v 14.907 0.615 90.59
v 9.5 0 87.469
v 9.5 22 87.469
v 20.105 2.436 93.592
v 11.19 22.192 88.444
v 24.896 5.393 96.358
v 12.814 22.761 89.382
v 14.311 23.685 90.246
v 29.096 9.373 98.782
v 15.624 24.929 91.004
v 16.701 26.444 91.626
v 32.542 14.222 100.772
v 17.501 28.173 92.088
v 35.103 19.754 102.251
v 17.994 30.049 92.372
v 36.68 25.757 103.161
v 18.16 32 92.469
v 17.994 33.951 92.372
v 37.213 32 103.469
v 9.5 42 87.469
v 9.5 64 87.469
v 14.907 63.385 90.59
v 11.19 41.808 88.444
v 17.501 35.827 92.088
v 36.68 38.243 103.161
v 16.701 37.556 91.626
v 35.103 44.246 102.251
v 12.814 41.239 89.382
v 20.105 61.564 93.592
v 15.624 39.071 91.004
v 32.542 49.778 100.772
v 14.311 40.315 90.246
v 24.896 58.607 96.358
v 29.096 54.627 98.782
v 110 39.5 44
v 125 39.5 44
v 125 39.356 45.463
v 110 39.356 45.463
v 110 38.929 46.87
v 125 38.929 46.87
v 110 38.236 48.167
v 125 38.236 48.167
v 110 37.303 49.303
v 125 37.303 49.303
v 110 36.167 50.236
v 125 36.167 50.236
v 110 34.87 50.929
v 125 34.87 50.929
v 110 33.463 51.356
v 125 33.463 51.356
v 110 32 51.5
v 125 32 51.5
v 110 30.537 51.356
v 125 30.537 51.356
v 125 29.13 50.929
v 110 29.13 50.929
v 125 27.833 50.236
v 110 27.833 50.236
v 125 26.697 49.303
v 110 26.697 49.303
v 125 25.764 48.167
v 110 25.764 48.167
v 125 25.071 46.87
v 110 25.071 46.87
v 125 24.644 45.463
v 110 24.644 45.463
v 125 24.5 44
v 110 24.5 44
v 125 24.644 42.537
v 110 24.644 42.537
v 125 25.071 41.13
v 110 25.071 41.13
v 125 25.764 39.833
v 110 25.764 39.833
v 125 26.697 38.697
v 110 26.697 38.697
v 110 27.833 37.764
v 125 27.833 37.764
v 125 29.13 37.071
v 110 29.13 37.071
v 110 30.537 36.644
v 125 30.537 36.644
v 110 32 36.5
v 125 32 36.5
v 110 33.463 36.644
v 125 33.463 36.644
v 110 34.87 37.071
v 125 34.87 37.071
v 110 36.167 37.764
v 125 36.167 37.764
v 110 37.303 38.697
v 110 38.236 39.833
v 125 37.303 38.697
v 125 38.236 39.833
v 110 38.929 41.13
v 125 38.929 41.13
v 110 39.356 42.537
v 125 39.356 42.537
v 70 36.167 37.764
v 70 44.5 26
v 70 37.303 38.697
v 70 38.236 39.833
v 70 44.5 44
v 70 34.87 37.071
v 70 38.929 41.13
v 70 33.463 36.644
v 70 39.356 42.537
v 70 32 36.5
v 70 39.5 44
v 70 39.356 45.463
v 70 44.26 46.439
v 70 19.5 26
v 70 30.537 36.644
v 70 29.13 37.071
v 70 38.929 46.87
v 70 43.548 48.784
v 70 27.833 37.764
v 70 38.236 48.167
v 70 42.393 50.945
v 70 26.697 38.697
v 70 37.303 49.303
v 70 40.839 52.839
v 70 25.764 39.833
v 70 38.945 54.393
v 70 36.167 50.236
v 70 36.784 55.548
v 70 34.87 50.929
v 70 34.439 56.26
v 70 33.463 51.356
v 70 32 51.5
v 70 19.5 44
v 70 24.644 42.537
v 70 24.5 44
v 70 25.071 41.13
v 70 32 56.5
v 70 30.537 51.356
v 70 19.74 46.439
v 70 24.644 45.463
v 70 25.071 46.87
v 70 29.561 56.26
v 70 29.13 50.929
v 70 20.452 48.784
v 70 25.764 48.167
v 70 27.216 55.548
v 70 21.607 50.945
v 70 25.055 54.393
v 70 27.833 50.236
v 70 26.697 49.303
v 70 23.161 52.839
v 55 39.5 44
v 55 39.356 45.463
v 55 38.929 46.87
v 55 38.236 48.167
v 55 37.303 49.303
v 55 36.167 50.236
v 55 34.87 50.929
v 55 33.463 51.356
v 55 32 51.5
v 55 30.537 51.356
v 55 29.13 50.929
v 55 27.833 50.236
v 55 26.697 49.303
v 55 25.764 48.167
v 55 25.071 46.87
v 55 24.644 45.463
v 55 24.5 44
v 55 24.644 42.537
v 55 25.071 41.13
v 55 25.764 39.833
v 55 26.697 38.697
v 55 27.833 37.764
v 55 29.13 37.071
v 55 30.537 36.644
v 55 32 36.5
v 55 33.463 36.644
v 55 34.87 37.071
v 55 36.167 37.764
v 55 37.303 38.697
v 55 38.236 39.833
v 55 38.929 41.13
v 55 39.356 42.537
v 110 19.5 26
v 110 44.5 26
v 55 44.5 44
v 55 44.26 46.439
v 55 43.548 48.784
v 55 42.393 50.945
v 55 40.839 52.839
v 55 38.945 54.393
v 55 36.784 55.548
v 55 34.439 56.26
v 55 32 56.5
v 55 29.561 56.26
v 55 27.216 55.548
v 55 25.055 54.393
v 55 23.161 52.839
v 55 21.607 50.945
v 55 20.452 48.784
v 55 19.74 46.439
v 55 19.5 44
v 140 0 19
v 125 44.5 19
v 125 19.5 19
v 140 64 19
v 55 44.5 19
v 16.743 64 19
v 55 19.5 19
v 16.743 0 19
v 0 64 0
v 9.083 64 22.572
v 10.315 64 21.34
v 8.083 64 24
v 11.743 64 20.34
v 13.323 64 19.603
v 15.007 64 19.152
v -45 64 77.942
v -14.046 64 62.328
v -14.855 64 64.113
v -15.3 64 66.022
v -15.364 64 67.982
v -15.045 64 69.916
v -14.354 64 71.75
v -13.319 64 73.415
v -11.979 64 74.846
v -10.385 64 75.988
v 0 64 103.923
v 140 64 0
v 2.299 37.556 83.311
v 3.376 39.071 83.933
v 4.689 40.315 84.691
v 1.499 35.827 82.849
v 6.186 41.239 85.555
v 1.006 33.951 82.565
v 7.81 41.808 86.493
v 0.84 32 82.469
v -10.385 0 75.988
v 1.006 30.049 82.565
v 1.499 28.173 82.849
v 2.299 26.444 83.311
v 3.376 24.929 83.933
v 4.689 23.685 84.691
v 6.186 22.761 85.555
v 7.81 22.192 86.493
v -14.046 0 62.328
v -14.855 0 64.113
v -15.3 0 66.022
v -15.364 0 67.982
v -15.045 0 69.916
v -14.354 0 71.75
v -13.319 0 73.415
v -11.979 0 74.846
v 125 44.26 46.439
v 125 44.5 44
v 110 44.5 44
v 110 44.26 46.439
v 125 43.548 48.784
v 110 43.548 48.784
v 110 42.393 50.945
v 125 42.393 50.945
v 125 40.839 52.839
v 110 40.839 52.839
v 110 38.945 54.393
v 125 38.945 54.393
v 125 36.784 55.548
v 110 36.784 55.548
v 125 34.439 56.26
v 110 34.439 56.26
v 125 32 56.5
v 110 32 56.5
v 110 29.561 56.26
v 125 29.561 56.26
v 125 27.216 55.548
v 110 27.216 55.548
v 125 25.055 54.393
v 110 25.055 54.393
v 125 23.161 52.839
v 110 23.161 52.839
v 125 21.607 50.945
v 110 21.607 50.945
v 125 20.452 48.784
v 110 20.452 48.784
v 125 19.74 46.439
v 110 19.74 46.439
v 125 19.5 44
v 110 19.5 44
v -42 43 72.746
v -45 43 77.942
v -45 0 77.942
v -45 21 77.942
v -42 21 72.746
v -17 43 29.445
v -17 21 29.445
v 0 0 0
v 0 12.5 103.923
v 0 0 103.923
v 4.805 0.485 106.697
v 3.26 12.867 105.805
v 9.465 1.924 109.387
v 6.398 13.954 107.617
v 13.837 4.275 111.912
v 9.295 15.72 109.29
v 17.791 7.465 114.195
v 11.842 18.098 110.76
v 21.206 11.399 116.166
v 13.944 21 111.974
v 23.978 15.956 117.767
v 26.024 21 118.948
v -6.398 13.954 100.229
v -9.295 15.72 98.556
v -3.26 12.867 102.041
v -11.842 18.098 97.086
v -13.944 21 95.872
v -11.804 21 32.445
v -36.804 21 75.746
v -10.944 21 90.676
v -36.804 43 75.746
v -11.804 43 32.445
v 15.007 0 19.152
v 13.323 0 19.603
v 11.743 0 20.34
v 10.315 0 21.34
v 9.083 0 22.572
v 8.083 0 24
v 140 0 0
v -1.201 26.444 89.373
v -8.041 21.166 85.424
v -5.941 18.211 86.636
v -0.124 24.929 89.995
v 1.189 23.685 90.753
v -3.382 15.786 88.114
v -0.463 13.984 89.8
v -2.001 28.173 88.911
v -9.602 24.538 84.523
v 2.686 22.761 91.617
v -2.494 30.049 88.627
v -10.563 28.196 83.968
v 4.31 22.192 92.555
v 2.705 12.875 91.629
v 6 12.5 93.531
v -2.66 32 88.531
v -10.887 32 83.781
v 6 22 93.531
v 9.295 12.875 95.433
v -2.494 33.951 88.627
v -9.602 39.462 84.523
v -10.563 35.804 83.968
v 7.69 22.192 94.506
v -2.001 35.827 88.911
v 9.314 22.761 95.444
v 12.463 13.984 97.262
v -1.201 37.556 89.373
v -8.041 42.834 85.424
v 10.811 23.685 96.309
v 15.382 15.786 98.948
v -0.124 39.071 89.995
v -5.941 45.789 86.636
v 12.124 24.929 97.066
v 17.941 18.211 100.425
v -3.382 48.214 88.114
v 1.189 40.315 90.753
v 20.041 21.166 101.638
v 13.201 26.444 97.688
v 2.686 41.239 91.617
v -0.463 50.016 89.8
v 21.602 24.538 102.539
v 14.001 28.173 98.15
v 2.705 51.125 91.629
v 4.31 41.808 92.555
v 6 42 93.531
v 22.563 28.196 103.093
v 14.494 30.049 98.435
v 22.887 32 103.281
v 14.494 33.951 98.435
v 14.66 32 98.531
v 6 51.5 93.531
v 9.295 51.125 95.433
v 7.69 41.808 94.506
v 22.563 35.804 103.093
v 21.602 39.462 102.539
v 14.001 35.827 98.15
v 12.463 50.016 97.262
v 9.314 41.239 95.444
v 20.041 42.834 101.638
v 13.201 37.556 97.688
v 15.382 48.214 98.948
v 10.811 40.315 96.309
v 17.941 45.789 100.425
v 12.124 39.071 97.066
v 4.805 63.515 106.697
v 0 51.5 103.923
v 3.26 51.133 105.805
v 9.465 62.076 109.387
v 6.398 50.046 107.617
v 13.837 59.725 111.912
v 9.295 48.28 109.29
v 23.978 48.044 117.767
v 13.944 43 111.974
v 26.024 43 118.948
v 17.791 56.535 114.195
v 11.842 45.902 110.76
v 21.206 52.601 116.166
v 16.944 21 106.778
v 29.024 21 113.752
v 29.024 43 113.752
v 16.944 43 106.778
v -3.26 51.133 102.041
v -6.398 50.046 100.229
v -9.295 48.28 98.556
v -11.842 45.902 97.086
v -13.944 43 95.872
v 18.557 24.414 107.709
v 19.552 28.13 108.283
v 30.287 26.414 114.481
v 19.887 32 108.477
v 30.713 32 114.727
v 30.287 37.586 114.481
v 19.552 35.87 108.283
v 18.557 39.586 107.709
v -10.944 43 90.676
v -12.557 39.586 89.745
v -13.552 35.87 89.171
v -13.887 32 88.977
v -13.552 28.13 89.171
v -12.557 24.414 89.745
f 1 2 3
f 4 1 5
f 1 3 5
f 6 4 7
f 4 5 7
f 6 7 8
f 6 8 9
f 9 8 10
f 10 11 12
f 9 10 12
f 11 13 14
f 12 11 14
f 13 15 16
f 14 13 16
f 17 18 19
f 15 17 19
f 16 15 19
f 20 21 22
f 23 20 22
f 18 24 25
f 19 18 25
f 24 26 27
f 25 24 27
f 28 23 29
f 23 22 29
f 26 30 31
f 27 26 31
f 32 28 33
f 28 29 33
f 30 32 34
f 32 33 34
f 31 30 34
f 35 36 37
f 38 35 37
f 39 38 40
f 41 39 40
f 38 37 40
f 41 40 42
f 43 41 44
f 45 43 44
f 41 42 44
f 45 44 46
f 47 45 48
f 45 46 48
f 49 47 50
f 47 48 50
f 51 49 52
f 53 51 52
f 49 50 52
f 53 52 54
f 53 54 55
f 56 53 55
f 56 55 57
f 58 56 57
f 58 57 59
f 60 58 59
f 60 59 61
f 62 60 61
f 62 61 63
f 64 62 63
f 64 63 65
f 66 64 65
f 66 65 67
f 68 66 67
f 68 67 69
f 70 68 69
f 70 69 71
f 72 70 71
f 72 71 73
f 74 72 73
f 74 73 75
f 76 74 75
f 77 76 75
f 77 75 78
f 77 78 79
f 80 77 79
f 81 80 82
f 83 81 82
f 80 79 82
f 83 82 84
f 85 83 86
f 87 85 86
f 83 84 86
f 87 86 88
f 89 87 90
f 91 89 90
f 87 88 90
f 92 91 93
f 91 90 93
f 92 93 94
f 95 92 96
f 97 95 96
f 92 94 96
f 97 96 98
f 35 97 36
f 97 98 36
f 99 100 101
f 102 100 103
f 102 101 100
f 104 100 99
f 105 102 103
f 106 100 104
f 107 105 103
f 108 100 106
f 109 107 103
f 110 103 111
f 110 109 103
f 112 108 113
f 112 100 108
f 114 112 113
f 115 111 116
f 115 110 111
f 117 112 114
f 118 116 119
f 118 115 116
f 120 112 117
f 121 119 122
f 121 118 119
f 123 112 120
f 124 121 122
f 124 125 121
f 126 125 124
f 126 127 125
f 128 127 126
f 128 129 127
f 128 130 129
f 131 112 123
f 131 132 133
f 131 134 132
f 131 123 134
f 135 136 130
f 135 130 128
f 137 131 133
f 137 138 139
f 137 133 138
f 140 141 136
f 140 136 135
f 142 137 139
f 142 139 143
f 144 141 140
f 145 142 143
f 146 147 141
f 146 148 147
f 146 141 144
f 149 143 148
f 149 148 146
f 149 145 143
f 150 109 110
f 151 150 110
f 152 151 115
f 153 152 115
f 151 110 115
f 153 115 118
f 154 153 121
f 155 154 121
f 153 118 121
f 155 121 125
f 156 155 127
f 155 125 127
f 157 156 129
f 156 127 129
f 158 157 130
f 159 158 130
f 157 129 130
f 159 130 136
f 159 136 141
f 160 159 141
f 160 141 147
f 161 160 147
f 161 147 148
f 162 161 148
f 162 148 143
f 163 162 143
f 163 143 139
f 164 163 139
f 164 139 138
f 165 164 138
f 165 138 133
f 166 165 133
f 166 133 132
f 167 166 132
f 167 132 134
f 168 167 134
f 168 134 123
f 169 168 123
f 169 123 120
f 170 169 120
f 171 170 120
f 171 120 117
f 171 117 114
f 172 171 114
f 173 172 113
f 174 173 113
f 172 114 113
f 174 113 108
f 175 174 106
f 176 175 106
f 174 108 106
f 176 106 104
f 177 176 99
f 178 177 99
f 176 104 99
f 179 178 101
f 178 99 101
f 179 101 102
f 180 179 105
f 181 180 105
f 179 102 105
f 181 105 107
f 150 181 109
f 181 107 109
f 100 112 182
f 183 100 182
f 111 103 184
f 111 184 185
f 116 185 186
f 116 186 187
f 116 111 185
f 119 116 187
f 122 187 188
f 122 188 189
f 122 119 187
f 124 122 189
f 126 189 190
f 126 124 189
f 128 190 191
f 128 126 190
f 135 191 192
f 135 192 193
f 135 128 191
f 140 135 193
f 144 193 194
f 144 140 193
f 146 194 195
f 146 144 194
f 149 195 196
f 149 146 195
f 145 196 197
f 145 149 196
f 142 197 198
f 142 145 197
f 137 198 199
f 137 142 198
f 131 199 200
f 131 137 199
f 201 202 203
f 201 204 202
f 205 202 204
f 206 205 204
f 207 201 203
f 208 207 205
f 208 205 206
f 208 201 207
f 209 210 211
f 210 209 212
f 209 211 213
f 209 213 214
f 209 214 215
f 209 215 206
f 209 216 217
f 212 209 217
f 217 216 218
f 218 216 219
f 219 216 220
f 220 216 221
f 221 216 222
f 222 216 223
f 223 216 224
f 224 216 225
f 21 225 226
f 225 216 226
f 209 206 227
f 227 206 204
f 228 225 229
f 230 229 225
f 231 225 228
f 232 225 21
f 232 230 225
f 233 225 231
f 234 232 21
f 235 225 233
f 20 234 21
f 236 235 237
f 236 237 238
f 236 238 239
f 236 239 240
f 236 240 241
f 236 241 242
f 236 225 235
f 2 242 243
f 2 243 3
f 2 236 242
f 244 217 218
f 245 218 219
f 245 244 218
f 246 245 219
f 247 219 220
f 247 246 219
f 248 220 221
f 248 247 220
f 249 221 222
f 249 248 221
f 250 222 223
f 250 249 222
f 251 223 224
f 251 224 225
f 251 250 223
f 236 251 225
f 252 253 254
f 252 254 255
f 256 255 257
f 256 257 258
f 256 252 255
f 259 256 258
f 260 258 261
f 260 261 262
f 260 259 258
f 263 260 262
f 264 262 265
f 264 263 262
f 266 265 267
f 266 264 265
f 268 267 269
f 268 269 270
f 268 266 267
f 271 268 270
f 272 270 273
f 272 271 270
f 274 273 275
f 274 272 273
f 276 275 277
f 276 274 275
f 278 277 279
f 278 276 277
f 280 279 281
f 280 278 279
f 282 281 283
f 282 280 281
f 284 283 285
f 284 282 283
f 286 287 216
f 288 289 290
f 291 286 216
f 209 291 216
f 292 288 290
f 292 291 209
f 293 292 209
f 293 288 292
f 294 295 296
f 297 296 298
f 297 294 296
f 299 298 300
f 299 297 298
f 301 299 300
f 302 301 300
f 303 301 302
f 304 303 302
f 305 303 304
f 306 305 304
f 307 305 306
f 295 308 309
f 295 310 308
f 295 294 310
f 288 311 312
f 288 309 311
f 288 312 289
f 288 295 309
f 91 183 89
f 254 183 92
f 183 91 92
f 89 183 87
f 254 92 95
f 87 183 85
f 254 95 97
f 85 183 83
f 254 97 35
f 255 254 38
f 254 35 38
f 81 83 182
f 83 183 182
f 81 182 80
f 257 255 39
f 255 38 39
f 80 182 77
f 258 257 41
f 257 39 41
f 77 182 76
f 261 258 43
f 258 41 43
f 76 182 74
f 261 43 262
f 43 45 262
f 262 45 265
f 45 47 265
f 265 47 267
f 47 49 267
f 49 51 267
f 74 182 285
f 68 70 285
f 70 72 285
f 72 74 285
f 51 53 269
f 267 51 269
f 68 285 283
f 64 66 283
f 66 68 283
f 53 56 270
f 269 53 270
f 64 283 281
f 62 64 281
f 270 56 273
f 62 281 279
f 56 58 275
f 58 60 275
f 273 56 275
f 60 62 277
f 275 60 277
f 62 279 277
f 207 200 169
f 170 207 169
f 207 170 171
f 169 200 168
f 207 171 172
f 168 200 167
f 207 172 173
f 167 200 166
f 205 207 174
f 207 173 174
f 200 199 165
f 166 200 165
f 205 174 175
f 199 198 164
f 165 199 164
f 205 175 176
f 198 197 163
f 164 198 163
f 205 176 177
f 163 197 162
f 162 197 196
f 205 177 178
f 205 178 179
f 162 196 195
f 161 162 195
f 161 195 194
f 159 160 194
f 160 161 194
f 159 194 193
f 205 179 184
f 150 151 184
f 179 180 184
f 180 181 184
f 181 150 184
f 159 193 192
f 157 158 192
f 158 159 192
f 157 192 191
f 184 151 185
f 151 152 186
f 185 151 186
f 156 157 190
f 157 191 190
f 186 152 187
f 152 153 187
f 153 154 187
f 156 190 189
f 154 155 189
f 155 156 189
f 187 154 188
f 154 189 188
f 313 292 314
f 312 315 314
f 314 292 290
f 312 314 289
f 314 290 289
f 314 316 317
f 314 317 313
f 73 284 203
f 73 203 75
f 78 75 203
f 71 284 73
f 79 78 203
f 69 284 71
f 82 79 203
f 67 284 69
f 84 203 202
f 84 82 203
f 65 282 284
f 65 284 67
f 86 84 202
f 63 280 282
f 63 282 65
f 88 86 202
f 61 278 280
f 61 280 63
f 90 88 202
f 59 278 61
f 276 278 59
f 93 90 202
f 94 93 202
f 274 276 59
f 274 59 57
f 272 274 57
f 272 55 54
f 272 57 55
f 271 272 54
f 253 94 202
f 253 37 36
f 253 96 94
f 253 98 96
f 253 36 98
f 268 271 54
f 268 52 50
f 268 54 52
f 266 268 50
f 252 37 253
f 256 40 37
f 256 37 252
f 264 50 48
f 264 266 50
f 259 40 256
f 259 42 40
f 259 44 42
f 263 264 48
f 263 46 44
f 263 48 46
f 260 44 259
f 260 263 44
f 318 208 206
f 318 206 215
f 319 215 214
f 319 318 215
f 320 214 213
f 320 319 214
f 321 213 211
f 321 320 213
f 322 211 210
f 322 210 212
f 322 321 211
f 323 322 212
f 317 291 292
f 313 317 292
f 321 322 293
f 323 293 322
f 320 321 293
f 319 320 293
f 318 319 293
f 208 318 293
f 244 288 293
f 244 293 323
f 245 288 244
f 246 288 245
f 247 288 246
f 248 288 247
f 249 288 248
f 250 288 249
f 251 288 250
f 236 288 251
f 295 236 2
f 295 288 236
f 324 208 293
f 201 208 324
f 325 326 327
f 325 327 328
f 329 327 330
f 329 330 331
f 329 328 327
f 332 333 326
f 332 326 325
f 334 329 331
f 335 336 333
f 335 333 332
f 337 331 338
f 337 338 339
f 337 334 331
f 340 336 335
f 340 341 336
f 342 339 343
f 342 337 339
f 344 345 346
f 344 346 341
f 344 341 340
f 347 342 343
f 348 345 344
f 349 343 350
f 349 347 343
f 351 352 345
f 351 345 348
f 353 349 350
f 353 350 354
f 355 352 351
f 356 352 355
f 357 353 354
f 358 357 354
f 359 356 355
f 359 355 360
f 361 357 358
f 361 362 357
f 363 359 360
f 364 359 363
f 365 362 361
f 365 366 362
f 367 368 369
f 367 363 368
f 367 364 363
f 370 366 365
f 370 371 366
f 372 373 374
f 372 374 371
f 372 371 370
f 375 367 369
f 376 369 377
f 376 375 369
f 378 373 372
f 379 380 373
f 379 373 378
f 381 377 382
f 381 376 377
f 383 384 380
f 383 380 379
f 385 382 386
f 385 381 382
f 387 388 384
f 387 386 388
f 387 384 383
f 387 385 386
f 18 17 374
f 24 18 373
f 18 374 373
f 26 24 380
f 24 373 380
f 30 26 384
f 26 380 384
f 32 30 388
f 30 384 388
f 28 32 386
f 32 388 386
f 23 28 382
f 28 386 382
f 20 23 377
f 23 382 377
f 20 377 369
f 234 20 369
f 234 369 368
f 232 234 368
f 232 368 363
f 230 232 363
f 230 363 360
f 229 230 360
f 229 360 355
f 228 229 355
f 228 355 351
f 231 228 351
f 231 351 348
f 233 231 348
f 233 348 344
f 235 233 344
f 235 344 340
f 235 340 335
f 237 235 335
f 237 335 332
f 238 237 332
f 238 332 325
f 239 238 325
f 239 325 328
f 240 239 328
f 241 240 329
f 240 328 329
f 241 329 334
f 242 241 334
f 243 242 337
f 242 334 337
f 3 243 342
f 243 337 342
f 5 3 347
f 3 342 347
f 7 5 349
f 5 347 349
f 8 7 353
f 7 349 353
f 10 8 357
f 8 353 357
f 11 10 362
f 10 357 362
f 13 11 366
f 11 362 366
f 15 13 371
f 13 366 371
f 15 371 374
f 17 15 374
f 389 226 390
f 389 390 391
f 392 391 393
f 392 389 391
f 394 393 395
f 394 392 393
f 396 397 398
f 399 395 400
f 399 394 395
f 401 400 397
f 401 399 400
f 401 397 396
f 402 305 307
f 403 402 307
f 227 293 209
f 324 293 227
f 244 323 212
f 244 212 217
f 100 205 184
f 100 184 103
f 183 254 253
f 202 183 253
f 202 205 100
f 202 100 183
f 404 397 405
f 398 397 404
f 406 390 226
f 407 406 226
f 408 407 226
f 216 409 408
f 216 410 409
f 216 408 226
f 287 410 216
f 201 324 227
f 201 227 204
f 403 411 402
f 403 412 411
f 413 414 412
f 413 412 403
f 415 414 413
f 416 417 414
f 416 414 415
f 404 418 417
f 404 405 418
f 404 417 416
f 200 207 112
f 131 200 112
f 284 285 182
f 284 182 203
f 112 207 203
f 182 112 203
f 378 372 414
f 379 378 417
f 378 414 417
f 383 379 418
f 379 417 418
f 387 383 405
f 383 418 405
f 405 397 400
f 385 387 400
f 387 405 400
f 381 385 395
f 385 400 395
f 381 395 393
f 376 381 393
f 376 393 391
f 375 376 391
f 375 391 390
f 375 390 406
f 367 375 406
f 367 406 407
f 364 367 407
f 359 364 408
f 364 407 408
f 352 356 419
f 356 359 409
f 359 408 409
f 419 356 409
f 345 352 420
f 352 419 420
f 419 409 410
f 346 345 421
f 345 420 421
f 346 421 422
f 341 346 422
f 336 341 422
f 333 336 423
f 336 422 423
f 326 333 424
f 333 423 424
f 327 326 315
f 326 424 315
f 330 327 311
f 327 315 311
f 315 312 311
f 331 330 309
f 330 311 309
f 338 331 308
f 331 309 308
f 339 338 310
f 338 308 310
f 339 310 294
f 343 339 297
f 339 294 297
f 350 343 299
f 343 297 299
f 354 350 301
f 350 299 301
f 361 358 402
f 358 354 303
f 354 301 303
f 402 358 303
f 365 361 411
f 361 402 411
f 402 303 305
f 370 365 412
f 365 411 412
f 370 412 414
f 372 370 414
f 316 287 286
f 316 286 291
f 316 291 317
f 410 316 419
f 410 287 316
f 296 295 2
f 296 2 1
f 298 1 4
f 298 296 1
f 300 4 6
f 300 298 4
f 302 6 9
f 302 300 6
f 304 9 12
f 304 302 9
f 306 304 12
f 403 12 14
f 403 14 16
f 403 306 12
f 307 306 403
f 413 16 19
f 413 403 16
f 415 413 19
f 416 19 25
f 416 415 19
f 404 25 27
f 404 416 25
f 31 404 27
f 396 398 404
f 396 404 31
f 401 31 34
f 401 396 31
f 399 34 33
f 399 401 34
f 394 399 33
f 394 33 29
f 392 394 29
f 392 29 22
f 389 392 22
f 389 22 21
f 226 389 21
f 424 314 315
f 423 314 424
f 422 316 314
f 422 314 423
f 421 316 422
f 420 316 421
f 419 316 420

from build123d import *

# Parameters (mm, degrees)
F1_DEPTH  = 64
F3_DEPTH  = 19
F4_R      = 10
F5_DEPTH  = 19
F6_R      = 19.5
F7_DEPTH  = 12
F8_W      = 83.9615242271
F8_H      = 22
F9_DEPTH  = 6
F10_W     = 22
F10_H     = 56
F11_DEPTH = 6
F12_W     = 70
F12_H     = 25
F13_DEPTH = 25
F15_DEPTH = 70
F16_R     = 7.5
F17_DEPTH = 70
F18_W     = 40
F18_H     = 40.1206766963
F19_DEPTH = 44.501


with BuildPart() as f1:
    # F0 (on Front) → F1 (new body)
    with BuildSketch(Plane.XZ):
        with BuildLine():
            Line((-45, 77.9422863406), (0, 0))
            Line((0, 0), (140, 0))
            Line((140, 0), (140, 19))
            Line((140, 19), (16.7431578065, 19))
            ThreePointArc((16.7431578065, 19), (11.7431578065, 20.3397459622), (8.0829037687, 24))
            Line((8.0829037687, 24), (-14.0455173281, 62.3275496309))
            ThreePointArc((-14.0455173281, 62.3275496309), (-15.0445215531, 69.9157400819), (-10.3852632903, 75.9878036687))
            Line((-10.3852632903, 75.9878036687), (9.5, 87.4685657822))
            Line((9.5, 87.4685657822), (0, 103.9230484541))
            Line((0, 103.9230484541), (-45, 77.9422863406))
        make_face()
    extrude(amount=-F1_DEPTH)

    # F2 (on face) → F3 (join)
    with BuildSketch(Plane(origin=(-45, 0, 77.9422863406), x_dir=(0.8660254038, 0, 0.5), z_dir=(-0.5, 0, 0.8660254038))):
        with BuildLine():
            Line((51.9615242271, 64), (51.9615242271, 0))
            ThreePointArc((51.9615242271, 0), (83.9615242271, 32), (51.9615242271, 64))
        make_face()
    extrude(amount=-F3_DEPTH)

    # F4 (on face) → F5 (cut)
    with BuildSketch(Plane(origin=(-45, 0, 77.9422863406), x_dir=(0.8660254038, 0, 0.5), z_dir=(-0.5, 0, 0.8660254038))):
        with Locations((51.9615242271, 32)):
            Circle(F4_R)
    extrude(amount=-F5_DEPTH, mode=Mode.SUBTRACT)

    # F6 (on face) → F7 (cut)
    with BuildSketch(Plane(origin=(-45, 0, 77.9422863406), x_dir=(0.8660254038, 0, 0.5), z_dir=(-0.5, 0, 0.8660254038))):
        with Locations((51.9615242271, 32)):
            Circle(F6_R)
    extrude(amount=-F7_DEPTH, mode=Mode.SUBTRACT)

    # F8 (on face) → F9 (cut)
    with BuildSketch(Plane(origin=(-45, 0, 77.9422863406), x_dir=(0.8660254038, 0, 0.5), z_dir=(-0.5, 0, 0.8660254038))):
        with Locations((41.9807621135, 32)):
            Rectangle(F8_W, F8_H)
    extrude(amount=-F9_DEPTH, mode=Mode.SUBTRACT)

    # F10 (on face) → F11 (cut)
    with BuildSketch(Plane(origin=(0, 0, 0), x_dir=(0, -1, 0), z_dir=(-0.8660254038, 0, -0.5))):
        with Locations((-32, 62)):
            Rectangle(F10_W, F10_H)
    extrude(amount=-F11_DEPTH, mode=Mode.SUBTRACT)

    # F12 (on face) → F13 (join)
    with BuildSketch(Plane.XY.offset(19)):
        with Locations((90, 32)):
            Rectangle(F12_W, F12_H)
    extrude(amount=F13_DEPTH)

    # F14 (on face) → F15 (join)
    with BuildSketch(Plane.YZ.offset(125)):
        with BuildLine():
            Line((19.5, 44), (44.5, 44))
            ThreePointArc((44.5, 44), (32, 56.5), (19.5, 44))
        make_face()
    extrude(amount=-F15_DEPTH)

    # F16 (on face) → F17 (cut)
    with BuildSketch(Plane.YZ.offset(125)):
        with Locations((32, 44)):
            Circle(F16_R)
    extrude(amount=-F17_DEPTH, mode=Mode.SUBTRACT)

    # F18 (on face) → F19 (cut, through all)
    with BuildSketch(Plane.XZ.offset(-19.5)):
        with Locations((90, 46.0603383482)):
            Rectangle(F18_W, F18_H)
    extrude(amount=-F19_DEPTH, mode=Mode.SUBTRACT)


solid = f1.part
